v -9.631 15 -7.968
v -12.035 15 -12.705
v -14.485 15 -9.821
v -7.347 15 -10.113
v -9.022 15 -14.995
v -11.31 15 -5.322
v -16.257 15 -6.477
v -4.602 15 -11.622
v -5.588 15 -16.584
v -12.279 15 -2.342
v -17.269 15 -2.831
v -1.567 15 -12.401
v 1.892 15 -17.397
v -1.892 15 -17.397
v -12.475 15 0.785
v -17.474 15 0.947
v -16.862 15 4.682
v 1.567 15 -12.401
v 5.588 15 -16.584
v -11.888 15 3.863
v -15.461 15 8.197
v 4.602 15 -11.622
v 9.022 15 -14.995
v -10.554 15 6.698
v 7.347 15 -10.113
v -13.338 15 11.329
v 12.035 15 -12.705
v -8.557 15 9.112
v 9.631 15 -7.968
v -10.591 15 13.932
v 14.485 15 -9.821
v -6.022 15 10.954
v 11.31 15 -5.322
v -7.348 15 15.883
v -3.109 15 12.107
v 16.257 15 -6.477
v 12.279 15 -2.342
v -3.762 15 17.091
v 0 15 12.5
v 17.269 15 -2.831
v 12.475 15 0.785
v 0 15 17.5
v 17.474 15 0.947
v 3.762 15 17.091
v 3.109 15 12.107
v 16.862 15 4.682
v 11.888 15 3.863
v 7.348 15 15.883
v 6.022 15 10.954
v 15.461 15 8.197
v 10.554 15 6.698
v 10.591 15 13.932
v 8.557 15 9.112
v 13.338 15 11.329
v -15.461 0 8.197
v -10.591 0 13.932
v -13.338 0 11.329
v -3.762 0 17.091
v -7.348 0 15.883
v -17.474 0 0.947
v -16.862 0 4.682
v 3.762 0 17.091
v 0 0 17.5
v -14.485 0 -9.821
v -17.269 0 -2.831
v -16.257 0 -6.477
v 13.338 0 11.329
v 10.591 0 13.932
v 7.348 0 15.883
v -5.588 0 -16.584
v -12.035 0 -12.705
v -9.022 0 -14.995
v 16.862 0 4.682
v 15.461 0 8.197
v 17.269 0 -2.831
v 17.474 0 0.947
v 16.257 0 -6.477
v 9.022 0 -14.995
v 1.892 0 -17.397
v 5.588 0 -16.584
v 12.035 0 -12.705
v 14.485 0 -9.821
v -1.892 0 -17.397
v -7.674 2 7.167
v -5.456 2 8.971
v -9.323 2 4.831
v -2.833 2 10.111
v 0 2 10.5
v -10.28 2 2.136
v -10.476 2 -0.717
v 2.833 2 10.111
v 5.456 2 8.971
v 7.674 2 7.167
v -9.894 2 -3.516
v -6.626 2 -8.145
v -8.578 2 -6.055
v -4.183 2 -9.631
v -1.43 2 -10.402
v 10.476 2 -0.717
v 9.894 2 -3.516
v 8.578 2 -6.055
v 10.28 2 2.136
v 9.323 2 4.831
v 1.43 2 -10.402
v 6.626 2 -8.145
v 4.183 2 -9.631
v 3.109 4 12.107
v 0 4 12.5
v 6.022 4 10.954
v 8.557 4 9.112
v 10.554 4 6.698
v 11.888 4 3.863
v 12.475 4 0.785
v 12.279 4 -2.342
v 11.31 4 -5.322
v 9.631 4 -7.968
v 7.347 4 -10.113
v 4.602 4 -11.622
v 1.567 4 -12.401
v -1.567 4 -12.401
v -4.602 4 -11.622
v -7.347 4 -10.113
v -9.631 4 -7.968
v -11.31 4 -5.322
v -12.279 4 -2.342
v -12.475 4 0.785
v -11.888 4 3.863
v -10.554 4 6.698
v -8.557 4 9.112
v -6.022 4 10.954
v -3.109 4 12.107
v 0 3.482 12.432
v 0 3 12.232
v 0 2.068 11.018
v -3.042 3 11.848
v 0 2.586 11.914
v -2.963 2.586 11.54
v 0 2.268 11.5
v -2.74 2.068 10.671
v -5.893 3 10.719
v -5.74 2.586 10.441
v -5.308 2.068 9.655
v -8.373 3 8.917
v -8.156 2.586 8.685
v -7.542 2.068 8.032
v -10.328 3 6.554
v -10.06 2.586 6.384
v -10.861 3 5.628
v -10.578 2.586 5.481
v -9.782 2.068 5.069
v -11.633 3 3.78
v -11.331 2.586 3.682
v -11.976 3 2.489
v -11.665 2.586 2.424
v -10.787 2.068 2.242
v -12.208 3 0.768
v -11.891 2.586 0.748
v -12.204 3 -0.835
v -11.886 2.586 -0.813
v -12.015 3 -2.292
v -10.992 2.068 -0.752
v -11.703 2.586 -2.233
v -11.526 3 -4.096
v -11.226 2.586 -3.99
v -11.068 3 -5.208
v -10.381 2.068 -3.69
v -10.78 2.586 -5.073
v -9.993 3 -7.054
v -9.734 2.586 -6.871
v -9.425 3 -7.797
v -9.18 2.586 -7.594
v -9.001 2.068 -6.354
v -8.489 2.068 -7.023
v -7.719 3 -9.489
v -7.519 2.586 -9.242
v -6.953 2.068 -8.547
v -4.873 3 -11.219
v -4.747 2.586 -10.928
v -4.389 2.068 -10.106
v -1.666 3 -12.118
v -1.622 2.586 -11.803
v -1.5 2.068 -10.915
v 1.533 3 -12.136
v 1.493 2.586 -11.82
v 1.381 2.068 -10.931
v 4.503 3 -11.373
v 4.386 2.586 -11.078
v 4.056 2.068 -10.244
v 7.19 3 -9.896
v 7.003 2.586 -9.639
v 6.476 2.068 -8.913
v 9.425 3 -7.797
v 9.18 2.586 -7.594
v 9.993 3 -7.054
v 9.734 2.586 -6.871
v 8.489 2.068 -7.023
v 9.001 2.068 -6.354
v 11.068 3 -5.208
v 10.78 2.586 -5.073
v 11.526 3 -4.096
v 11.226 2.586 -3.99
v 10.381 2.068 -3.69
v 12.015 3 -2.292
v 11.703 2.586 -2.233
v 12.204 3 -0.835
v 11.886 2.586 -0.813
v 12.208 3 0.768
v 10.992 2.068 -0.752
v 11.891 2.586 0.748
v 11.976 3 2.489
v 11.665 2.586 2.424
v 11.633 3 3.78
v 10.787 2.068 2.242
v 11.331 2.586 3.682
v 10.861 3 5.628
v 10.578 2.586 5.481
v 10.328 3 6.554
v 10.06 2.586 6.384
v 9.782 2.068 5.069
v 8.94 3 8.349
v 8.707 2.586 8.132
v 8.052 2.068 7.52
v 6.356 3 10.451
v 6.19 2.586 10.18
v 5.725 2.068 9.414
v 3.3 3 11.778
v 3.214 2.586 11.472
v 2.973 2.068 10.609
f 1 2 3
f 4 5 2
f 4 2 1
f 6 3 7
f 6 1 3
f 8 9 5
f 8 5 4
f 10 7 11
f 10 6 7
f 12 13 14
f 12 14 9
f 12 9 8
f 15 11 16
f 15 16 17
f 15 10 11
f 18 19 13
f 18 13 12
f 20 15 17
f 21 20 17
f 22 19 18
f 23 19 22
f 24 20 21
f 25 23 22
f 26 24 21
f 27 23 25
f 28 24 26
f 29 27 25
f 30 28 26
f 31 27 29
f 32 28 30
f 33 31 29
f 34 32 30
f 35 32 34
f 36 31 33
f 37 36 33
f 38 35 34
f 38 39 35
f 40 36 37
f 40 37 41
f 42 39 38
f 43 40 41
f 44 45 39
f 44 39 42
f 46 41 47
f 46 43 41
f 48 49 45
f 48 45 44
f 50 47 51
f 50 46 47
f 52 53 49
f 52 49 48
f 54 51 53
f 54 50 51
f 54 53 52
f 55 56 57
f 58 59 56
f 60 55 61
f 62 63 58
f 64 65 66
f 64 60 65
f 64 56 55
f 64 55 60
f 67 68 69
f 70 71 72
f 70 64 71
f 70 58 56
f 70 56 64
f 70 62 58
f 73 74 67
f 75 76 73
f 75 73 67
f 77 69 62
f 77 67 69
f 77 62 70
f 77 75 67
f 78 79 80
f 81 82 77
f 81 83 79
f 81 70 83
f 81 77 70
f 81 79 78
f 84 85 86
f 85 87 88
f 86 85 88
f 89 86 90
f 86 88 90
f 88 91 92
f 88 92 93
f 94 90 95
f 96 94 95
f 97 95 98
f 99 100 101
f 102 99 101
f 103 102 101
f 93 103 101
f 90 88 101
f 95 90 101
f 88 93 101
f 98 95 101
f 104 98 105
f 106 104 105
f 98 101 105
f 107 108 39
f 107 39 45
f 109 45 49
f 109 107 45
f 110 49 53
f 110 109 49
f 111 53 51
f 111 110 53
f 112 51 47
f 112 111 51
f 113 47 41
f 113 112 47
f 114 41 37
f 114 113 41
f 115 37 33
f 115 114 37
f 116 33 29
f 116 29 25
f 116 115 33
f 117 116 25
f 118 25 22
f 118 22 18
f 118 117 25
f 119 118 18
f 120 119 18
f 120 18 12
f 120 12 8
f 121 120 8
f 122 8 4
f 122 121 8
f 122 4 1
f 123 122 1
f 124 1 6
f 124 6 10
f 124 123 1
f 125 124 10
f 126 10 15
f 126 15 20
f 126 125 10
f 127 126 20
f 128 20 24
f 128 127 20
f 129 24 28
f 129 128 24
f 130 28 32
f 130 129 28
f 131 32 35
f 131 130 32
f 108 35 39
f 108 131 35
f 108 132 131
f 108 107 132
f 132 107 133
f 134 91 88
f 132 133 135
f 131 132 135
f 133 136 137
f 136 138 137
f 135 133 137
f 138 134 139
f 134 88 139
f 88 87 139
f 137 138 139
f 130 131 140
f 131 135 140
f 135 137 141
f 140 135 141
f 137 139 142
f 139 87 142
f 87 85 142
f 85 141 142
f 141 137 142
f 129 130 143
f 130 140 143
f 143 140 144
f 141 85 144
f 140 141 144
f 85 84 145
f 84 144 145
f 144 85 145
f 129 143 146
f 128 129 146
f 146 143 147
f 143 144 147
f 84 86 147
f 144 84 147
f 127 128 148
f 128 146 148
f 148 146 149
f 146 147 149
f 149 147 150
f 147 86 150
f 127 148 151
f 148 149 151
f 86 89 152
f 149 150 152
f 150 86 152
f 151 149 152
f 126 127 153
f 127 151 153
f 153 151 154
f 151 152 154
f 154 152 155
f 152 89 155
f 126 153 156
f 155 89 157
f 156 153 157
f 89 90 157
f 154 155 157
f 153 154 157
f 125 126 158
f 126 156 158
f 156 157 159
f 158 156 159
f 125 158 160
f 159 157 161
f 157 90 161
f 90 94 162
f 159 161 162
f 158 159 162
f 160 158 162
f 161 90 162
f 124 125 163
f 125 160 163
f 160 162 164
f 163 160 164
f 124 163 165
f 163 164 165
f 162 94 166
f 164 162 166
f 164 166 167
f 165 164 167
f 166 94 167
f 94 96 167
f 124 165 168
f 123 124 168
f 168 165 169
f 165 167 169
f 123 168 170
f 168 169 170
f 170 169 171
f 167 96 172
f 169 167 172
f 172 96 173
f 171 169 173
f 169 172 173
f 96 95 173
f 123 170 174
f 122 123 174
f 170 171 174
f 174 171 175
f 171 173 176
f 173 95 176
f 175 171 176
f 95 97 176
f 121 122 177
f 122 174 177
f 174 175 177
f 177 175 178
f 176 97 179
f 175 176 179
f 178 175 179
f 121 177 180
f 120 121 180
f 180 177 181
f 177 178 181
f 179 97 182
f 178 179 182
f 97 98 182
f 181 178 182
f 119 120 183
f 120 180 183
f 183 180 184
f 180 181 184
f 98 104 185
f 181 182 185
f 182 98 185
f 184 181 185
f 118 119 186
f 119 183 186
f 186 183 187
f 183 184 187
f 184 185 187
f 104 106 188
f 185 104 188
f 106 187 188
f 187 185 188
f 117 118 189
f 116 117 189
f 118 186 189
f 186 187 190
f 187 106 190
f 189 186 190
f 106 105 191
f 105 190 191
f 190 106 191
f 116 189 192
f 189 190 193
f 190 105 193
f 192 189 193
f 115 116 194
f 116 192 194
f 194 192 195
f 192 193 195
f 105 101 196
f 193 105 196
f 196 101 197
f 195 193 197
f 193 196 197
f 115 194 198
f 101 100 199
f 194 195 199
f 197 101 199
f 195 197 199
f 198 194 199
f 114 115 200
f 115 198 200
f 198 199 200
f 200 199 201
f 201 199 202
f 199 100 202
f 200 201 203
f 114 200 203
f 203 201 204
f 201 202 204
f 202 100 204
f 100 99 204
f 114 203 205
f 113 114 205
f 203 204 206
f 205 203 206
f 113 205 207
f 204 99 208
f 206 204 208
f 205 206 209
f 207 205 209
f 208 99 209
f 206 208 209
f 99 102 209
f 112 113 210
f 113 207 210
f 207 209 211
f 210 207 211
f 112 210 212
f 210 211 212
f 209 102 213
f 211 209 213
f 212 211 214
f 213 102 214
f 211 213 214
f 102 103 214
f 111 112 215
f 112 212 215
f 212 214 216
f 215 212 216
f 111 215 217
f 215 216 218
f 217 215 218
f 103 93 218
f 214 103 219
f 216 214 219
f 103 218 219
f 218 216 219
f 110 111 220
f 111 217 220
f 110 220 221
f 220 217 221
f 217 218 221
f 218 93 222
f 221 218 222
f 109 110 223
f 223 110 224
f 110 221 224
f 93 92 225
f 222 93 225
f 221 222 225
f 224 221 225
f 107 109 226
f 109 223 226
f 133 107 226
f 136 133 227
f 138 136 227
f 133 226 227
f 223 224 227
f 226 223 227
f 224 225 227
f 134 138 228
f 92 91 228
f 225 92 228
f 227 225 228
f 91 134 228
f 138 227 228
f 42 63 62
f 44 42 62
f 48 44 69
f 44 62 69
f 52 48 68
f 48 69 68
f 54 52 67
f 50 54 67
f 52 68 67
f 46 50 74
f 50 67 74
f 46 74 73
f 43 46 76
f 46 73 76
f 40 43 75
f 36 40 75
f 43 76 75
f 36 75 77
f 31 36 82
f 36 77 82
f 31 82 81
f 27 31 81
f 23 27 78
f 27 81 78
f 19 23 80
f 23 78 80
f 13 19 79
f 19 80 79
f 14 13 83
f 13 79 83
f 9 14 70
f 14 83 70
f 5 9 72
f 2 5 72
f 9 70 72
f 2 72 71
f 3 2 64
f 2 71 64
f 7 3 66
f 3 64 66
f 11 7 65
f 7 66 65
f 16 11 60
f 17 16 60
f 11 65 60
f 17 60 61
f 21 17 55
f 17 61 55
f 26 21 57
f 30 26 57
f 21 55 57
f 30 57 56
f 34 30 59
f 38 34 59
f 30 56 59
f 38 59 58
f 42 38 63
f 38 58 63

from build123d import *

# Parameters (mm, degrees)
SKETCH1_R           = 17.5
SKETCH1_R_2         = 12.5
BOSS_EXTRUDE1_DEPTH = 15
SKETCH2_R           = 12.5
BOSS_EXTRUDE2_DEPTH = 2
FILLET1_R           = 2


with BuildPart() as part:
    # Sketch1 → Boss-Extrude1 (new body)
    with BuildSketch(Plane(origin=(0, 0, 0), x_dir=(1, 0, 0), z_dir=(0, 1, 0))):
        with Locations(Location((0, 0, 0), (0, 0, 270))):
            Circle(SKETCH1_R)
        with Locations(Location((0, 0, 0), (0, 0, 270))):
            Circle(SKETCH1_R_2, mode=Mode.SUBTRACT)
    extrude(amount=BOSS_EXTRUDE1_DEPTH)

    # Sketch2 → Boss-Extrude2 (add)
    with BuildSketch(Plane.XZ):
        with Locations(Location((0, 0, 0), (0, 0, 270))):
            Circle(SKETCH2_R)
    extrude(amount=-BOSS_EXTRUDE2_DEPTH)

    # Fillet1
    fillet1_edges = [part.edges().sort_by_distance(p)[0] for p in [
        (0, 2, -12.5),
    ]]
    fillet(fillet1_edges, radius=FILLET1_R)


solid = part.part
